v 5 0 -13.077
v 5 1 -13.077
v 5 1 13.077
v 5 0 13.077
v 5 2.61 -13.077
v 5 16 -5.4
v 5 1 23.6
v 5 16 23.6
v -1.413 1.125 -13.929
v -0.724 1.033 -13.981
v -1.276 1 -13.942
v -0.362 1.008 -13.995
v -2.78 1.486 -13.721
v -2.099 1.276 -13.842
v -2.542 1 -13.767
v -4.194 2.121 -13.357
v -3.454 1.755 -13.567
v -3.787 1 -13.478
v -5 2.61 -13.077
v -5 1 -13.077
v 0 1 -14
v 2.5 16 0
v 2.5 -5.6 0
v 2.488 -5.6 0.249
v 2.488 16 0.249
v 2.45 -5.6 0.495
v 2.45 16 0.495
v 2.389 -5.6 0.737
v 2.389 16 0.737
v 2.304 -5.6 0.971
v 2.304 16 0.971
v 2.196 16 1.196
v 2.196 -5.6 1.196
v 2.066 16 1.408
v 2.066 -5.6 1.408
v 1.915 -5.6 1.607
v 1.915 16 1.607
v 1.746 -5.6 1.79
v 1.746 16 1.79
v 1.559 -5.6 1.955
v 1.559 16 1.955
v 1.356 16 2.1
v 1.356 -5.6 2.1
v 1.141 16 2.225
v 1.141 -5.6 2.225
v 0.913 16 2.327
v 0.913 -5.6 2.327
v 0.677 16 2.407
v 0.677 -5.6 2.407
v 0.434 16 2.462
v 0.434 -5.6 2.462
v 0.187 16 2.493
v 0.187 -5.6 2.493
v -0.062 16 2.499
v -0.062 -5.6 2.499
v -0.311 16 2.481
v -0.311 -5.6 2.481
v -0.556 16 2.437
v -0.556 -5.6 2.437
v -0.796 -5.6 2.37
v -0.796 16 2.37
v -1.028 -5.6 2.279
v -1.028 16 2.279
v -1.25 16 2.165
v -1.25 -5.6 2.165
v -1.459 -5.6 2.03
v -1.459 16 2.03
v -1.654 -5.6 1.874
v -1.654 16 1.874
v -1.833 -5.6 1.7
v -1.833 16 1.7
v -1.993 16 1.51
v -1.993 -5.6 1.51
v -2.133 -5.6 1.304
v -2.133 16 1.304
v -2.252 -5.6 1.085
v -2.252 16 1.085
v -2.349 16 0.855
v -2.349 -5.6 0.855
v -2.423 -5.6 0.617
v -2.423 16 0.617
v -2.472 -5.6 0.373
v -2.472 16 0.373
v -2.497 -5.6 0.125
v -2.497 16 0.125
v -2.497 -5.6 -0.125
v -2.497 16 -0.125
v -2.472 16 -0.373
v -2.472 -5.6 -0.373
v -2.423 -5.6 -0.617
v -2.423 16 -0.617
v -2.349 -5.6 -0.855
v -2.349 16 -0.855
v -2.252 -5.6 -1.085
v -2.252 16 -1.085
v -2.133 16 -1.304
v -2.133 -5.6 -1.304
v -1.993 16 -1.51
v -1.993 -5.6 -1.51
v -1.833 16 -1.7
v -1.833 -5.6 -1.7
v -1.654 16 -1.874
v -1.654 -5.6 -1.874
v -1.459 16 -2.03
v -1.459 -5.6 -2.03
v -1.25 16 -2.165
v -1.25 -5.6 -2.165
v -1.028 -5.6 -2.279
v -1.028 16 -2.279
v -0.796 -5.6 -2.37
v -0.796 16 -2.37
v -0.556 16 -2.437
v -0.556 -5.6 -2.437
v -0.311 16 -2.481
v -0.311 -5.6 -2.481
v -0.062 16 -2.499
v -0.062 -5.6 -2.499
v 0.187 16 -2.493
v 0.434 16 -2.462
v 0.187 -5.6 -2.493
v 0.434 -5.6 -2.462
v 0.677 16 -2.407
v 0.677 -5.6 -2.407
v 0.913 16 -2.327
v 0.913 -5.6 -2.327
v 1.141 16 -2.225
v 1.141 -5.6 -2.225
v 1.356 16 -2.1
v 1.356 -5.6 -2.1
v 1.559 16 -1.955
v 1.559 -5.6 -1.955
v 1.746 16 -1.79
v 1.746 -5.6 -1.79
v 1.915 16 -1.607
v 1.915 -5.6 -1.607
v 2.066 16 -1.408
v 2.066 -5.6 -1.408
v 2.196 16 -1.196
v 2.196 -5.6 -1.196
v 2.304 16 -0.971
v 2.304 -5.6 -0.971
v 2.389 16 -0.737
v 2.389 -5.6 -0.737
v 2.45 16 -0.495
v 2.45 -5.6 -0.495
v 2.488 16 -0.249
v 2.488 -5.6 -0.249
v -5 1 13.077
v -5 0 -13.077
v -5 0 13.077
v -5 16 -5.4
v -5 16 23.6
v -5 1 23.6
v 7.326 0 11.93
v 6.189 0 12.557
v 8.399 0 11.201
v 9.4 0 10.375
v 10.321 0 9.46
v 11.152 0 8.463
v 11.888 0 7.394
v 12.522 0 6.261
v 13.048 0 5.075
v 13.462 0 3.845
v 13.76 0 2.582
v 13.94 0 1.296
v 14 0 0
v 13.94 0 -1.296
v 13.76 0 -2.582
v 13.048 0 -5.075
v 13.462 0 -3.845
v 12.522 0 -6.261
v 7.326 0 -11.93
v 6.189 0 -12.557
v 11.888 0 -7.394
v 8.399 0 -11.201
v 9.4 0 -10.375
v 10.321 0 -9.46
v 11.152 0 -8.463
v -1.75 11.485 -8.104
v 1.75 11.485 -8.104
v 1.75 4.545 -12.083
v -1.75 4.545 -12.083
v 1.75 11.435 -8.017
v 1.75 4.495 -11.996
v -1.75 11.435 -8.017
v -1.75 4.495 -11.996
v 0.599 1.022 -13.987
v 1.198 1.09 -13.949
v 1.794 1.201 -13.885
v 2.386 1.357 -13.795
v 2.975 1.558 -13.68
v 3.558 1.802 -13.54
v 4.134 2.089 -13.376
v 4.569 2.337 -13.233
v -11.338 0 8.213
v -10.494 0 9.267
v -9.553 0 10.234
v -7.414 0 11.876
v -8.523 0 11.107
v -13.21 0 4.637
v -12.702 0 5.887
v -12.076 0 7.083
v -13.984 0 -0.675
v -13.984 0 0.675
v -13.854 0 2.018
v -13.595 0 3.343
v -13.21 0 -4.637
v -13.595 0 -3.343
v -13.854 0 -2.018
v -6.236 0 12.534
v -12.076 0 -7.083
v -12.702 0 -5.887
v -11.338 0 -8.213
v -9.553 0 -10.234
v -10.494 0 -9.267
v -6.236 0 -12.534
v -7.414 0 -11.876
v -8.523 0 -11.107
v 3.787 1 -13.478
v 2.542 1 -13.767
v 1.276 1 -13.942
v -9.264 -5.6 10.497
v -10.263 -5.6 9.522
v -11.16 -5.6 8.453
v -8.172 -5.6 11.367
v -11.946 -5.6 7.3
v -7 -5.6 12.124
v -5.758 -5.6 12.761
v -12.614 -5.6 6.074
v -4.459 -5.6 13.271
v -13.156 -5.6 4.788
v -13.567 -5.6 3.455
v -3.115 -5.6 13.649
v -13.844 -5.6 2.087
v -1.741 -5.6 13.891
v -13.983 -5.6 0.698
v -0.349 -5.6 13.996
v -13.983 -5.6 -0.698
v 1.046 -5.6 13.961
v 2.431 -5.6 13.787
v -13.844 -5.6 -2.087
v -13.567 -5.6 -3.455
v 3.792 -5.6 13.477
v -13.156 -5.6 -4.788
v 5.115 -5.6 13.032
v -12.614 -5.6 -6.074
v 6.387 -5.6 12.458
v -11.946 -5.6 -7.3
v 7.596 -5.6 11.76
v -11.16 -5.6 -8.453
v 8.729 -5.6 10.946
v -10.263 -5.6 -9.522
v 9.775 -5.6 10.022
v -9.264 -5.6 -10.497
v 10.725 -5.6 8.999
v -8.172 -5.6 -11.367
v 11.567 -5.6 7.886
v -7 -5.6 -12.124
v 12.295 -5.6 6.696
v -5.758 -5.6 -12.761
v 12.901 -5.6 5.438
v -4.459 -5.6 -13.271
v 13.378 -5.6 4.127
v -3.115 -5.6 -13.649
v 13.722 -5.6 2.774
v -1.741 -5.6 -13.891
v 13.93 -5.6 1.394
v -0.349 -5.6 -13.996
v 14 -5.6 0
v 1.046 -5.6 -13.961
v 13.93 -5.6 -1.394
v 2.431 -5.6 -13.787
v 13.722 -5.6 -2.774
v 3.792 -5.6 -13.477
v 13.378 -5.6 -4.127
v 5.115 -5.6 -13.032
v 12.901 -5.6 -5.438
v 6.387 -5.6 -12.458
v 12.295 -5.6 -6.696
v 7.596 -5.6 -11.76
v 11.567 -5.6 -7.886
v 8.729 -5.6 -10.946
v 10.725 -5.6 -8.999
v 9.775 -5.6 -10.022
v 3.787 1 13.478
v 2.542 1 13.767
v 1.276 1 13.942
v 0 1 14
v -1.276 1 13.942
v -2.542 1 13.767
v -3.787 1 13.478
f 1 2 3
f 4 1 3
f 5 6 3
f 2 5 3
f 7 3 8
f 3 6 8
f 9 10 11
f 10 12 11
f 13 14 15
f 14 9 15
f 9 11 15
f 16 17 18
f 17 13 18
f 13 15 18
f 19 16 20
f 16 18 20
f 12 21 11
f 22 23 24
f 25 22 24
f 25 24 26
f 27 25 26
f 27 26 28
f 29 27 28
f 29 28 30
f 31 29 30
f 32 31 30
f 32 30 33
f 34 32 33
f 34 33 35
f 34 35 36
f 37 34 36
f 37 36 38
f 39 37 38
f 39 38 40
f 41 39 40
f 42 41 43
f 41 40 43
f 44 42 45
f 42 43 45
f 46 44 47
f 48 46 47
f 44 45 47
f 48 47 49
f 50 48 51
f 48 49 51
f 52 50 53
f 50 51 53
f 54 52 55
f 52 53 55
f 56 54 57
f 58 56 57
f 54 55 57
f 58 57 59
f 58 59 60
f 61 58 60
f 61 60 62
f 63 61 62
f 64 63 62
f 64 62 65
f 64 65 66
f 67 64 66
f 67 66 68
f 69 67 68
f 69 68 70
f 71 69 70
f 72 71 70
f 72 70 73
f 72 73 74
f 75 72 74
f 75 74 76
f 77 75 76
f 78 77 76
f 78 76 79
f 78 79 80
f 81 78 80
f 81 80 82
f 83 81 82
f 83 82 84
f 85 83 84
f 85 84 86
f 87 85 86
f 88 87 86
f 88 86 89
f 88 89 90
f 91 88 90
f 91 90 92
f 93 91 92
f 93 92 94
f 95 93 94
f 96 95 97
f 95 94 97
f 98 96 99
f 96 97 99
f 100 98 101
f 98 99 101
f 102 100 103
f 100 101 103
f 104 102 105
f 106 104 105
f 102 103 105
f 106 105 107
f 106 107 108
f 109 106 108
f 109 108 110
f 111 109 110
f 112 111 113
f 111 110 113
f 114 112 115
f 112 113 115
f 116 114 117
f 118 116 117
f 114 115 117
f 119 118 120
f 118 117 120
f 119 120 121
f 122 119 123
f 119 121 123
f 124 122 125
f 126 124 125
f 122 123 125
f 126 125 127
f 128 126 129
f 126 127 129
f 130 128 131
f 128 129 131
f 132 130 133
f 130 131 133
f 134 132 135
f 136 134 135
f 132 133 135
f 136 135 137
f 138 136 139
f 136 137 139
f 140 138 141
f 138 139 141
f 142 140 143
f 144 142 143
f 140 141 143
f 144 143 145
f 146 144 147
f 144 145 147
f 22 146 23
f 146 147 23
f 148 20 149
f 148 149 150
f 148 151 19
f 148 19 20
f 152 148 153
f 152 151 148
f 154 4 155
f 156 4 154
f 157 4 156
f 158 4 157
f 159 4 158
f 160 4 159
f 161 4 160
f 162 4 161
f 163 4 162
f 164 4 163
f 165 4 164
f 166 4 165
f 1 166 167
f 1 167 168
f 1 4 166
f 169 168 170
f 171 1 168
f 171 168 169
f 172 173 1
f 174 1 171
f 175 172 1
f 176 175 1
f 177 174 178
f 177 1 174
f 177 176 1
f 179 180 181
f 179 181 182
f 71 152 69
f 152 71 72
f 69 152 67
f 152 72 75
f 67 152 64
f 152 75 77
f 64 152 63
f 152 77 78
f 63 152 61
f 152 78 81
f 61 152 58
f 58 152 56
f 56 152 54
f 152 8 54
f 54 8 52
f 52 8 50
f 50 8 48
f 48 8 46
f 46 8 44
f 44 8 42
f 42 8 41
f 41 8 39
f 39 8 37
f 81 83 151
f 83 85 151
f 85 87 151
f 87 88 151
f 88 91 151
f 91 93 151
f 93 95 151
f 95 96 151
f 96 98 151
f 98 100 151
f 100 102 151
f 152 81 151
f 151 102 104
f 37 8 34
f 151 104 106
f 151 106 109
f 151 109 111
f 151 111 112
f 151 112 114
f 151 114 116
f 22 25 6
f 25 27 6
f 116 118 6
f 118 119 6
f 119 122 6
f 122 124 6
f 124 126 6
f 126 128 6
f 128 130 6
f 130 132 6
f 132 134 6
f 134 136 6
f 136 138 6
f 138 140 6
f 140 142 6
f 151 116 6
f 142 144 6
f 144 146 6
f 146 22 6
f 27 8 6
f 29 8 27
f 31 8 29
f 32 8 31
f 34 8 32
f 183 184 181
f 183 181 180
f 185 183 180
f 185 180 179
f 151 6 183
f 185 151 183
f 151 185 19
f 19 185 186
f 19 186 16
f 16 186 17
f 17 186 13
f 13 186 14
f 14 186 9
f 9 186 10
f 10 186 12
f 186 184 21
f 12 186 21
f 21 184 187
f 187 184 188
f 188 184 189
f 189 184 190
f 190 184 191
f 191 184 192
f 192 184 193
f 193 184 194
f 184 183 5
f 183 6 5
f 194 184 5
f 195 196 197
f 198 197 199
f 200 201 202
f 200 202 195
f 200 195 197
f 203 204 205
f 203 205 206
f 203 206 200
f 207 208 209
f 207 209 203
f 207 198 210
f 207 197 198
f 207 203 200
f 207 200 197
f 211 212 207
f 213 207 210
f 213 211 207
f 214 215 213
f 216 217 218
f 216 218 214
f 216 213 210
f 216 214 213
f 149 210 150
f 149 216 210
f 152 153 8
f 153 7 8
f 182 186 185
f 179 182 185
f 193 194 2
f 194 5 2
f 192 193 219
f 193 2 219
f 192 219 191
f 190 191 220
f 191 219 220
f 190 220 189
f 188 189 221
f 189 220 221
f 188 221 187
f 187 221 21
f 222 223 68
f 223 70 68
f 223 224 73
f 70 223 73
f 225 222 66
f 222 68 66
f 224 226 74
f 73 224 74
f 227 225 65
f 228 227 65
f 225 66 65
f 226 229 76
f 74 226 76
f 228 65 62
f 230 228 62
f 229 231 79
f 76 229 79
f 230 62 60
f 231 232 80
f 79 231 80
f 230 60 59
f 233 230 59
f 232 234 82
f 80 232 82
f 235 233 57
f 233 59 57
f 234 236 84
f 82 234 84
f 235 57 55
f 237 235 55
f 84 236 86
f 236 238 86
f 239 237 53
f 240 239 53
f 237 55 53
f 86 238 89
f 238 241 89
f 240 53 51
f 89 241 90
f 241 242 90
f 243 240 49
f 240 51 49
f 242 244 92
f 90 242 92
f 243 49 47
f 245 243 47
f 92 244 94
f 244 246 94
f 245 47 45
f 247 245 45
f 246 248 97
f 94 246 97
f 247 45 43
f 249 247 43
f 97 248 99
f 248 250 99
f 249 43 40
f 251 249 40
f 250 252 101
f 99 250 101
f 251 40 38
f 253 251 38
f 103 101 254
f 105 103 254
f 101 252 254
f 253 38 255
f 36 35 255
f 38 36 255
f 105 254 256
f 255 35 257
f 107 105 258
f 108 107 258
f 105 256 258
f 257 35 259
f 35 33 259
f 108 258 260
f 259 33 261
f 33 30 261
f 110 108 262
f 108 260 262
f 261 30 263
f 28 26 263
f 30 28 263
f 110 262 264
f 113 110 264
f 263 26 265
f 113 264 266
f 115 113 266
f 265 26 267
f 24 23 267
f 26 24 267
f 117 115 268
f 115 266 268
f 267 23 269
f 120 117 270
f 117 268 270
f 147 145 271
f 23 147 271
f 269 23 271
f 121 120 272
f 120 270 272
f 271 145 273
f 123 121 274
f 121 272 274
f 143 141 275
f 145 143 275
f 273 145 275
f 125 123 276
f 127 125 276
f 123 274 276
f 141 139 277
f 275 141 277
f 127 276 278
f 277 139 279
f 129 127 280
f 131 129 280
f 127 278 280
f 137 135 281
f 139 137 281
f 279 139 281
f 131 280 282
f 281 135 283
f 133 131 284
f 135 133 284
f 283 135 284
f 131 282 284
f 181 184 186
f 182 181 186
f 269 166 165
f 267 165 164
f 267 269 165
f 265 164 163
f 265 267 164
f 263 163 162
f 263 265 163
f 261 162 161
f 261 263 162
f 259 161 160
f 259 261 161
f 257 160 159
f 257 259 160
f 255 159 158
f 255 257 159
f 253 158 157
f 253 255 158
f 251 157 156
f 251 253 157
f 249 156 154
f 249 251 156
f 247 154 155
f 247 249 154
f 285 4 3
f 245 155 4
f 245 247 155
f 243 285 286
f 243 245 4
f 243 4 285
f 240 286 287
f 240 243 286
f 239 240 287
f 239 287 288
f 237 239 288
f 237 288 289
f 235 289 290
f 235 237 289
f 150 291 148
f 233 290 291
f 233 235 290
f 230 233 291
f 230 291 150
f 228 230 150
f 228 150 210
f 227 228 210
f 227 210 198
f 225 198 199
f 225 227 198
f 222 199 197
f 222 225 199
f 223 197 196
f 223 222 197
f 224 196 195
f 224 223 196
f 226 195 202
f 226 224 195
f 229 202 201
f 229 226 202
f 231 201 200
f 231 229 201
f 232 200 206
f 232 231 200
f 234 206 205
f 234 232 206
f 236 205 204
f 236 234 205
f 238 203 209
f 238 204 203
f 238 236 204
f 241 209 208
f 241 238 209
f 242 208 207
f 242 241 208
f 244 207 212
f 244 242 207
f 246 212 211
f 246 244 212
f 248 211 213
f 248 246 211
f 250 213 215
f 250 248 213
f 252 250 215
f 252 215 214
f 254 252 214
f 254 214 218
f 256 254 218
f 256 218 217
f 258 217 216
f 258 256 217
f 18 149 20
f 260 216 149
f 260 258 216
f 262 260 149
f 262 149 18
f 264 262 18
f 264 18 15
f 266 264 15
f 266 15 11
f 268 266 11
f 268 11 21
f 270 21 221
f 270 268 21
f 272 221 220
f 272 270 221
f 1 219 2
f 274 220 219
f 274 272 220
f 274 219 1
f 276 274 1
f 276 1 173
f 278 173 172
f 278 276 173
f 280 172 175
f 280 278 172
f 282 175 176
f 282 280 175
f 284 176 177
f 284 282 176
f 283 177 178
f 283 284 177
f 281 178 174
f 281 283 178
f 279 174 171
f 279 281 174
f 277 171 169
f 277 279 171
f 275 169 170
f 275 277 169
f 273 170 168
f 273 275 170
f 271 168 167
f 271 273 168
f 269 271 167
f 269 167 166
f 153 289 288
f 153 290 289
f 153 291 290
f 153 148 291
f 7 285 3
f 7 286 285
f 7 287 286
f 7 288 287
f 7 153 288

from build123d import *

# Parameters (mm, degrees)
IZIM1_R                     = 14
Y_KSEKLIK_EKSTR_ZYON1_DEPTH = 5.6
Y_KSEKLIK_EKSTR_ZYON2_DEPTH = 5
IZIM3_OUTSIDE_W             = 40.324
IZIM3_OUTSIDE_H             = 49.924
IZIM3_OUTSIDE_R             = 14
KES_EKSTR_ZYON1_DEPTH       = 6.6
KES_EKSTR_ZYON2_DEPTH       = 10
IZIM5_R                     = 2.5
KES_EKSTR_ZYON3_DEPTH       = 22.6
IZIM6_W                     = 3.5
IZIM6_H                     = 8
Y_KSEKLIK_EKSTR_ZYON3_DEPTH = 0.1


with BuildPart() as part:
    # Çizim1 → Yükseklik-Ekstrüzyon1 (new body)
    with BuildSketch(Plane(origin=(0, 0, 0), x_dir=(1, 0, 0), z_dir=(0, 1, 0))):
        Circle(IZIM1_R)
    extrude(amount=-Y_KSEKLIK_EKSTR_ZYON1_DEPTH)

    # Çizim2 → Yükseklik-Ekstrüzyon2 (add, symmetric)
    with BuildSketch(Plane(origin=(0, 0, 0), x_dir=(0, 0, -1), z_dir=(1, 0, 0))):
        Polygon((-14, 0), (-14, 1), (-23.6, 1), (-23.6, 16), (5.4, 16), (14, 1), (14, 0), align=None)
    extrude(amount=Y_KSEKLIK_EKSTR_ZYON2_DEPTH, both=True)

    # Çizim3 outside → Kes-Ekstrüzyon1 (cut)
    with BuildSketch(Plane.XZ.offset(5.6)):
        with Locations((0, 4.8)):
            Rectangle(IZIM3_OUTSIDE_W, IZIM3_OUTSIDE_H)
        Circle(IZIM3_OUTSIDE_R, mode=Mode.SUBTRACT)
    extrude(amount=-KES_EKSTR_ZYON1_DEPTH, mode=Mode.SUBTRACT)

    # Çizim4 → Kes-Ekstrüzyon2 (cut)
    with BuildSketch(Plane.XZ.offset(5.6)):
        with BuildLine():
            ThreePointArc((5, -13.076697), (2.542267, -13.767239), (0, -14))
            Line((0, -14), (5, -14))
            Line((5, -14), (5, -13.076697))
        make_face()
        with BuildLine():
            Line((-5, -13.076697), (-5, -14))
            Line((-5, -14), (0, -14))
            ThreePointArc((0, -14), (-2.542267, -13.767239), (-5, -13.076697))
        make_face()
    extrude(amount=-KES_EKSTR_ZYON2_DEPTH, mode=Mode.SUBTRACT)

    # Çizim5 → Kes-Ekstrüzyon3 (cut, through all)
    with BuildSketch(Plane.XZ.offset(5.6)):
        Circle(IZIM5_R)
    extrude(amount=-KES_EKSTR_ZYON3_DEPTH, mode=Mode.SUBTRACT)

    # Çizim6 → Yükseklik-Ekstrüzyon3 (add)
    with BuildSketch(Plane(origin=(0, 6.288333, -10.968022), x_dir=(-1, 0, 0), z_dir=(0, 0.497384, -0.86753))):
        with Locations((0, 1.932636)):
            Rectangle(IZIM6_W, IZIM6_H)
    extrude(amount=Y_KSEKLIK_EKSTR_ZYON3_DEPTH)


solid = part.part
